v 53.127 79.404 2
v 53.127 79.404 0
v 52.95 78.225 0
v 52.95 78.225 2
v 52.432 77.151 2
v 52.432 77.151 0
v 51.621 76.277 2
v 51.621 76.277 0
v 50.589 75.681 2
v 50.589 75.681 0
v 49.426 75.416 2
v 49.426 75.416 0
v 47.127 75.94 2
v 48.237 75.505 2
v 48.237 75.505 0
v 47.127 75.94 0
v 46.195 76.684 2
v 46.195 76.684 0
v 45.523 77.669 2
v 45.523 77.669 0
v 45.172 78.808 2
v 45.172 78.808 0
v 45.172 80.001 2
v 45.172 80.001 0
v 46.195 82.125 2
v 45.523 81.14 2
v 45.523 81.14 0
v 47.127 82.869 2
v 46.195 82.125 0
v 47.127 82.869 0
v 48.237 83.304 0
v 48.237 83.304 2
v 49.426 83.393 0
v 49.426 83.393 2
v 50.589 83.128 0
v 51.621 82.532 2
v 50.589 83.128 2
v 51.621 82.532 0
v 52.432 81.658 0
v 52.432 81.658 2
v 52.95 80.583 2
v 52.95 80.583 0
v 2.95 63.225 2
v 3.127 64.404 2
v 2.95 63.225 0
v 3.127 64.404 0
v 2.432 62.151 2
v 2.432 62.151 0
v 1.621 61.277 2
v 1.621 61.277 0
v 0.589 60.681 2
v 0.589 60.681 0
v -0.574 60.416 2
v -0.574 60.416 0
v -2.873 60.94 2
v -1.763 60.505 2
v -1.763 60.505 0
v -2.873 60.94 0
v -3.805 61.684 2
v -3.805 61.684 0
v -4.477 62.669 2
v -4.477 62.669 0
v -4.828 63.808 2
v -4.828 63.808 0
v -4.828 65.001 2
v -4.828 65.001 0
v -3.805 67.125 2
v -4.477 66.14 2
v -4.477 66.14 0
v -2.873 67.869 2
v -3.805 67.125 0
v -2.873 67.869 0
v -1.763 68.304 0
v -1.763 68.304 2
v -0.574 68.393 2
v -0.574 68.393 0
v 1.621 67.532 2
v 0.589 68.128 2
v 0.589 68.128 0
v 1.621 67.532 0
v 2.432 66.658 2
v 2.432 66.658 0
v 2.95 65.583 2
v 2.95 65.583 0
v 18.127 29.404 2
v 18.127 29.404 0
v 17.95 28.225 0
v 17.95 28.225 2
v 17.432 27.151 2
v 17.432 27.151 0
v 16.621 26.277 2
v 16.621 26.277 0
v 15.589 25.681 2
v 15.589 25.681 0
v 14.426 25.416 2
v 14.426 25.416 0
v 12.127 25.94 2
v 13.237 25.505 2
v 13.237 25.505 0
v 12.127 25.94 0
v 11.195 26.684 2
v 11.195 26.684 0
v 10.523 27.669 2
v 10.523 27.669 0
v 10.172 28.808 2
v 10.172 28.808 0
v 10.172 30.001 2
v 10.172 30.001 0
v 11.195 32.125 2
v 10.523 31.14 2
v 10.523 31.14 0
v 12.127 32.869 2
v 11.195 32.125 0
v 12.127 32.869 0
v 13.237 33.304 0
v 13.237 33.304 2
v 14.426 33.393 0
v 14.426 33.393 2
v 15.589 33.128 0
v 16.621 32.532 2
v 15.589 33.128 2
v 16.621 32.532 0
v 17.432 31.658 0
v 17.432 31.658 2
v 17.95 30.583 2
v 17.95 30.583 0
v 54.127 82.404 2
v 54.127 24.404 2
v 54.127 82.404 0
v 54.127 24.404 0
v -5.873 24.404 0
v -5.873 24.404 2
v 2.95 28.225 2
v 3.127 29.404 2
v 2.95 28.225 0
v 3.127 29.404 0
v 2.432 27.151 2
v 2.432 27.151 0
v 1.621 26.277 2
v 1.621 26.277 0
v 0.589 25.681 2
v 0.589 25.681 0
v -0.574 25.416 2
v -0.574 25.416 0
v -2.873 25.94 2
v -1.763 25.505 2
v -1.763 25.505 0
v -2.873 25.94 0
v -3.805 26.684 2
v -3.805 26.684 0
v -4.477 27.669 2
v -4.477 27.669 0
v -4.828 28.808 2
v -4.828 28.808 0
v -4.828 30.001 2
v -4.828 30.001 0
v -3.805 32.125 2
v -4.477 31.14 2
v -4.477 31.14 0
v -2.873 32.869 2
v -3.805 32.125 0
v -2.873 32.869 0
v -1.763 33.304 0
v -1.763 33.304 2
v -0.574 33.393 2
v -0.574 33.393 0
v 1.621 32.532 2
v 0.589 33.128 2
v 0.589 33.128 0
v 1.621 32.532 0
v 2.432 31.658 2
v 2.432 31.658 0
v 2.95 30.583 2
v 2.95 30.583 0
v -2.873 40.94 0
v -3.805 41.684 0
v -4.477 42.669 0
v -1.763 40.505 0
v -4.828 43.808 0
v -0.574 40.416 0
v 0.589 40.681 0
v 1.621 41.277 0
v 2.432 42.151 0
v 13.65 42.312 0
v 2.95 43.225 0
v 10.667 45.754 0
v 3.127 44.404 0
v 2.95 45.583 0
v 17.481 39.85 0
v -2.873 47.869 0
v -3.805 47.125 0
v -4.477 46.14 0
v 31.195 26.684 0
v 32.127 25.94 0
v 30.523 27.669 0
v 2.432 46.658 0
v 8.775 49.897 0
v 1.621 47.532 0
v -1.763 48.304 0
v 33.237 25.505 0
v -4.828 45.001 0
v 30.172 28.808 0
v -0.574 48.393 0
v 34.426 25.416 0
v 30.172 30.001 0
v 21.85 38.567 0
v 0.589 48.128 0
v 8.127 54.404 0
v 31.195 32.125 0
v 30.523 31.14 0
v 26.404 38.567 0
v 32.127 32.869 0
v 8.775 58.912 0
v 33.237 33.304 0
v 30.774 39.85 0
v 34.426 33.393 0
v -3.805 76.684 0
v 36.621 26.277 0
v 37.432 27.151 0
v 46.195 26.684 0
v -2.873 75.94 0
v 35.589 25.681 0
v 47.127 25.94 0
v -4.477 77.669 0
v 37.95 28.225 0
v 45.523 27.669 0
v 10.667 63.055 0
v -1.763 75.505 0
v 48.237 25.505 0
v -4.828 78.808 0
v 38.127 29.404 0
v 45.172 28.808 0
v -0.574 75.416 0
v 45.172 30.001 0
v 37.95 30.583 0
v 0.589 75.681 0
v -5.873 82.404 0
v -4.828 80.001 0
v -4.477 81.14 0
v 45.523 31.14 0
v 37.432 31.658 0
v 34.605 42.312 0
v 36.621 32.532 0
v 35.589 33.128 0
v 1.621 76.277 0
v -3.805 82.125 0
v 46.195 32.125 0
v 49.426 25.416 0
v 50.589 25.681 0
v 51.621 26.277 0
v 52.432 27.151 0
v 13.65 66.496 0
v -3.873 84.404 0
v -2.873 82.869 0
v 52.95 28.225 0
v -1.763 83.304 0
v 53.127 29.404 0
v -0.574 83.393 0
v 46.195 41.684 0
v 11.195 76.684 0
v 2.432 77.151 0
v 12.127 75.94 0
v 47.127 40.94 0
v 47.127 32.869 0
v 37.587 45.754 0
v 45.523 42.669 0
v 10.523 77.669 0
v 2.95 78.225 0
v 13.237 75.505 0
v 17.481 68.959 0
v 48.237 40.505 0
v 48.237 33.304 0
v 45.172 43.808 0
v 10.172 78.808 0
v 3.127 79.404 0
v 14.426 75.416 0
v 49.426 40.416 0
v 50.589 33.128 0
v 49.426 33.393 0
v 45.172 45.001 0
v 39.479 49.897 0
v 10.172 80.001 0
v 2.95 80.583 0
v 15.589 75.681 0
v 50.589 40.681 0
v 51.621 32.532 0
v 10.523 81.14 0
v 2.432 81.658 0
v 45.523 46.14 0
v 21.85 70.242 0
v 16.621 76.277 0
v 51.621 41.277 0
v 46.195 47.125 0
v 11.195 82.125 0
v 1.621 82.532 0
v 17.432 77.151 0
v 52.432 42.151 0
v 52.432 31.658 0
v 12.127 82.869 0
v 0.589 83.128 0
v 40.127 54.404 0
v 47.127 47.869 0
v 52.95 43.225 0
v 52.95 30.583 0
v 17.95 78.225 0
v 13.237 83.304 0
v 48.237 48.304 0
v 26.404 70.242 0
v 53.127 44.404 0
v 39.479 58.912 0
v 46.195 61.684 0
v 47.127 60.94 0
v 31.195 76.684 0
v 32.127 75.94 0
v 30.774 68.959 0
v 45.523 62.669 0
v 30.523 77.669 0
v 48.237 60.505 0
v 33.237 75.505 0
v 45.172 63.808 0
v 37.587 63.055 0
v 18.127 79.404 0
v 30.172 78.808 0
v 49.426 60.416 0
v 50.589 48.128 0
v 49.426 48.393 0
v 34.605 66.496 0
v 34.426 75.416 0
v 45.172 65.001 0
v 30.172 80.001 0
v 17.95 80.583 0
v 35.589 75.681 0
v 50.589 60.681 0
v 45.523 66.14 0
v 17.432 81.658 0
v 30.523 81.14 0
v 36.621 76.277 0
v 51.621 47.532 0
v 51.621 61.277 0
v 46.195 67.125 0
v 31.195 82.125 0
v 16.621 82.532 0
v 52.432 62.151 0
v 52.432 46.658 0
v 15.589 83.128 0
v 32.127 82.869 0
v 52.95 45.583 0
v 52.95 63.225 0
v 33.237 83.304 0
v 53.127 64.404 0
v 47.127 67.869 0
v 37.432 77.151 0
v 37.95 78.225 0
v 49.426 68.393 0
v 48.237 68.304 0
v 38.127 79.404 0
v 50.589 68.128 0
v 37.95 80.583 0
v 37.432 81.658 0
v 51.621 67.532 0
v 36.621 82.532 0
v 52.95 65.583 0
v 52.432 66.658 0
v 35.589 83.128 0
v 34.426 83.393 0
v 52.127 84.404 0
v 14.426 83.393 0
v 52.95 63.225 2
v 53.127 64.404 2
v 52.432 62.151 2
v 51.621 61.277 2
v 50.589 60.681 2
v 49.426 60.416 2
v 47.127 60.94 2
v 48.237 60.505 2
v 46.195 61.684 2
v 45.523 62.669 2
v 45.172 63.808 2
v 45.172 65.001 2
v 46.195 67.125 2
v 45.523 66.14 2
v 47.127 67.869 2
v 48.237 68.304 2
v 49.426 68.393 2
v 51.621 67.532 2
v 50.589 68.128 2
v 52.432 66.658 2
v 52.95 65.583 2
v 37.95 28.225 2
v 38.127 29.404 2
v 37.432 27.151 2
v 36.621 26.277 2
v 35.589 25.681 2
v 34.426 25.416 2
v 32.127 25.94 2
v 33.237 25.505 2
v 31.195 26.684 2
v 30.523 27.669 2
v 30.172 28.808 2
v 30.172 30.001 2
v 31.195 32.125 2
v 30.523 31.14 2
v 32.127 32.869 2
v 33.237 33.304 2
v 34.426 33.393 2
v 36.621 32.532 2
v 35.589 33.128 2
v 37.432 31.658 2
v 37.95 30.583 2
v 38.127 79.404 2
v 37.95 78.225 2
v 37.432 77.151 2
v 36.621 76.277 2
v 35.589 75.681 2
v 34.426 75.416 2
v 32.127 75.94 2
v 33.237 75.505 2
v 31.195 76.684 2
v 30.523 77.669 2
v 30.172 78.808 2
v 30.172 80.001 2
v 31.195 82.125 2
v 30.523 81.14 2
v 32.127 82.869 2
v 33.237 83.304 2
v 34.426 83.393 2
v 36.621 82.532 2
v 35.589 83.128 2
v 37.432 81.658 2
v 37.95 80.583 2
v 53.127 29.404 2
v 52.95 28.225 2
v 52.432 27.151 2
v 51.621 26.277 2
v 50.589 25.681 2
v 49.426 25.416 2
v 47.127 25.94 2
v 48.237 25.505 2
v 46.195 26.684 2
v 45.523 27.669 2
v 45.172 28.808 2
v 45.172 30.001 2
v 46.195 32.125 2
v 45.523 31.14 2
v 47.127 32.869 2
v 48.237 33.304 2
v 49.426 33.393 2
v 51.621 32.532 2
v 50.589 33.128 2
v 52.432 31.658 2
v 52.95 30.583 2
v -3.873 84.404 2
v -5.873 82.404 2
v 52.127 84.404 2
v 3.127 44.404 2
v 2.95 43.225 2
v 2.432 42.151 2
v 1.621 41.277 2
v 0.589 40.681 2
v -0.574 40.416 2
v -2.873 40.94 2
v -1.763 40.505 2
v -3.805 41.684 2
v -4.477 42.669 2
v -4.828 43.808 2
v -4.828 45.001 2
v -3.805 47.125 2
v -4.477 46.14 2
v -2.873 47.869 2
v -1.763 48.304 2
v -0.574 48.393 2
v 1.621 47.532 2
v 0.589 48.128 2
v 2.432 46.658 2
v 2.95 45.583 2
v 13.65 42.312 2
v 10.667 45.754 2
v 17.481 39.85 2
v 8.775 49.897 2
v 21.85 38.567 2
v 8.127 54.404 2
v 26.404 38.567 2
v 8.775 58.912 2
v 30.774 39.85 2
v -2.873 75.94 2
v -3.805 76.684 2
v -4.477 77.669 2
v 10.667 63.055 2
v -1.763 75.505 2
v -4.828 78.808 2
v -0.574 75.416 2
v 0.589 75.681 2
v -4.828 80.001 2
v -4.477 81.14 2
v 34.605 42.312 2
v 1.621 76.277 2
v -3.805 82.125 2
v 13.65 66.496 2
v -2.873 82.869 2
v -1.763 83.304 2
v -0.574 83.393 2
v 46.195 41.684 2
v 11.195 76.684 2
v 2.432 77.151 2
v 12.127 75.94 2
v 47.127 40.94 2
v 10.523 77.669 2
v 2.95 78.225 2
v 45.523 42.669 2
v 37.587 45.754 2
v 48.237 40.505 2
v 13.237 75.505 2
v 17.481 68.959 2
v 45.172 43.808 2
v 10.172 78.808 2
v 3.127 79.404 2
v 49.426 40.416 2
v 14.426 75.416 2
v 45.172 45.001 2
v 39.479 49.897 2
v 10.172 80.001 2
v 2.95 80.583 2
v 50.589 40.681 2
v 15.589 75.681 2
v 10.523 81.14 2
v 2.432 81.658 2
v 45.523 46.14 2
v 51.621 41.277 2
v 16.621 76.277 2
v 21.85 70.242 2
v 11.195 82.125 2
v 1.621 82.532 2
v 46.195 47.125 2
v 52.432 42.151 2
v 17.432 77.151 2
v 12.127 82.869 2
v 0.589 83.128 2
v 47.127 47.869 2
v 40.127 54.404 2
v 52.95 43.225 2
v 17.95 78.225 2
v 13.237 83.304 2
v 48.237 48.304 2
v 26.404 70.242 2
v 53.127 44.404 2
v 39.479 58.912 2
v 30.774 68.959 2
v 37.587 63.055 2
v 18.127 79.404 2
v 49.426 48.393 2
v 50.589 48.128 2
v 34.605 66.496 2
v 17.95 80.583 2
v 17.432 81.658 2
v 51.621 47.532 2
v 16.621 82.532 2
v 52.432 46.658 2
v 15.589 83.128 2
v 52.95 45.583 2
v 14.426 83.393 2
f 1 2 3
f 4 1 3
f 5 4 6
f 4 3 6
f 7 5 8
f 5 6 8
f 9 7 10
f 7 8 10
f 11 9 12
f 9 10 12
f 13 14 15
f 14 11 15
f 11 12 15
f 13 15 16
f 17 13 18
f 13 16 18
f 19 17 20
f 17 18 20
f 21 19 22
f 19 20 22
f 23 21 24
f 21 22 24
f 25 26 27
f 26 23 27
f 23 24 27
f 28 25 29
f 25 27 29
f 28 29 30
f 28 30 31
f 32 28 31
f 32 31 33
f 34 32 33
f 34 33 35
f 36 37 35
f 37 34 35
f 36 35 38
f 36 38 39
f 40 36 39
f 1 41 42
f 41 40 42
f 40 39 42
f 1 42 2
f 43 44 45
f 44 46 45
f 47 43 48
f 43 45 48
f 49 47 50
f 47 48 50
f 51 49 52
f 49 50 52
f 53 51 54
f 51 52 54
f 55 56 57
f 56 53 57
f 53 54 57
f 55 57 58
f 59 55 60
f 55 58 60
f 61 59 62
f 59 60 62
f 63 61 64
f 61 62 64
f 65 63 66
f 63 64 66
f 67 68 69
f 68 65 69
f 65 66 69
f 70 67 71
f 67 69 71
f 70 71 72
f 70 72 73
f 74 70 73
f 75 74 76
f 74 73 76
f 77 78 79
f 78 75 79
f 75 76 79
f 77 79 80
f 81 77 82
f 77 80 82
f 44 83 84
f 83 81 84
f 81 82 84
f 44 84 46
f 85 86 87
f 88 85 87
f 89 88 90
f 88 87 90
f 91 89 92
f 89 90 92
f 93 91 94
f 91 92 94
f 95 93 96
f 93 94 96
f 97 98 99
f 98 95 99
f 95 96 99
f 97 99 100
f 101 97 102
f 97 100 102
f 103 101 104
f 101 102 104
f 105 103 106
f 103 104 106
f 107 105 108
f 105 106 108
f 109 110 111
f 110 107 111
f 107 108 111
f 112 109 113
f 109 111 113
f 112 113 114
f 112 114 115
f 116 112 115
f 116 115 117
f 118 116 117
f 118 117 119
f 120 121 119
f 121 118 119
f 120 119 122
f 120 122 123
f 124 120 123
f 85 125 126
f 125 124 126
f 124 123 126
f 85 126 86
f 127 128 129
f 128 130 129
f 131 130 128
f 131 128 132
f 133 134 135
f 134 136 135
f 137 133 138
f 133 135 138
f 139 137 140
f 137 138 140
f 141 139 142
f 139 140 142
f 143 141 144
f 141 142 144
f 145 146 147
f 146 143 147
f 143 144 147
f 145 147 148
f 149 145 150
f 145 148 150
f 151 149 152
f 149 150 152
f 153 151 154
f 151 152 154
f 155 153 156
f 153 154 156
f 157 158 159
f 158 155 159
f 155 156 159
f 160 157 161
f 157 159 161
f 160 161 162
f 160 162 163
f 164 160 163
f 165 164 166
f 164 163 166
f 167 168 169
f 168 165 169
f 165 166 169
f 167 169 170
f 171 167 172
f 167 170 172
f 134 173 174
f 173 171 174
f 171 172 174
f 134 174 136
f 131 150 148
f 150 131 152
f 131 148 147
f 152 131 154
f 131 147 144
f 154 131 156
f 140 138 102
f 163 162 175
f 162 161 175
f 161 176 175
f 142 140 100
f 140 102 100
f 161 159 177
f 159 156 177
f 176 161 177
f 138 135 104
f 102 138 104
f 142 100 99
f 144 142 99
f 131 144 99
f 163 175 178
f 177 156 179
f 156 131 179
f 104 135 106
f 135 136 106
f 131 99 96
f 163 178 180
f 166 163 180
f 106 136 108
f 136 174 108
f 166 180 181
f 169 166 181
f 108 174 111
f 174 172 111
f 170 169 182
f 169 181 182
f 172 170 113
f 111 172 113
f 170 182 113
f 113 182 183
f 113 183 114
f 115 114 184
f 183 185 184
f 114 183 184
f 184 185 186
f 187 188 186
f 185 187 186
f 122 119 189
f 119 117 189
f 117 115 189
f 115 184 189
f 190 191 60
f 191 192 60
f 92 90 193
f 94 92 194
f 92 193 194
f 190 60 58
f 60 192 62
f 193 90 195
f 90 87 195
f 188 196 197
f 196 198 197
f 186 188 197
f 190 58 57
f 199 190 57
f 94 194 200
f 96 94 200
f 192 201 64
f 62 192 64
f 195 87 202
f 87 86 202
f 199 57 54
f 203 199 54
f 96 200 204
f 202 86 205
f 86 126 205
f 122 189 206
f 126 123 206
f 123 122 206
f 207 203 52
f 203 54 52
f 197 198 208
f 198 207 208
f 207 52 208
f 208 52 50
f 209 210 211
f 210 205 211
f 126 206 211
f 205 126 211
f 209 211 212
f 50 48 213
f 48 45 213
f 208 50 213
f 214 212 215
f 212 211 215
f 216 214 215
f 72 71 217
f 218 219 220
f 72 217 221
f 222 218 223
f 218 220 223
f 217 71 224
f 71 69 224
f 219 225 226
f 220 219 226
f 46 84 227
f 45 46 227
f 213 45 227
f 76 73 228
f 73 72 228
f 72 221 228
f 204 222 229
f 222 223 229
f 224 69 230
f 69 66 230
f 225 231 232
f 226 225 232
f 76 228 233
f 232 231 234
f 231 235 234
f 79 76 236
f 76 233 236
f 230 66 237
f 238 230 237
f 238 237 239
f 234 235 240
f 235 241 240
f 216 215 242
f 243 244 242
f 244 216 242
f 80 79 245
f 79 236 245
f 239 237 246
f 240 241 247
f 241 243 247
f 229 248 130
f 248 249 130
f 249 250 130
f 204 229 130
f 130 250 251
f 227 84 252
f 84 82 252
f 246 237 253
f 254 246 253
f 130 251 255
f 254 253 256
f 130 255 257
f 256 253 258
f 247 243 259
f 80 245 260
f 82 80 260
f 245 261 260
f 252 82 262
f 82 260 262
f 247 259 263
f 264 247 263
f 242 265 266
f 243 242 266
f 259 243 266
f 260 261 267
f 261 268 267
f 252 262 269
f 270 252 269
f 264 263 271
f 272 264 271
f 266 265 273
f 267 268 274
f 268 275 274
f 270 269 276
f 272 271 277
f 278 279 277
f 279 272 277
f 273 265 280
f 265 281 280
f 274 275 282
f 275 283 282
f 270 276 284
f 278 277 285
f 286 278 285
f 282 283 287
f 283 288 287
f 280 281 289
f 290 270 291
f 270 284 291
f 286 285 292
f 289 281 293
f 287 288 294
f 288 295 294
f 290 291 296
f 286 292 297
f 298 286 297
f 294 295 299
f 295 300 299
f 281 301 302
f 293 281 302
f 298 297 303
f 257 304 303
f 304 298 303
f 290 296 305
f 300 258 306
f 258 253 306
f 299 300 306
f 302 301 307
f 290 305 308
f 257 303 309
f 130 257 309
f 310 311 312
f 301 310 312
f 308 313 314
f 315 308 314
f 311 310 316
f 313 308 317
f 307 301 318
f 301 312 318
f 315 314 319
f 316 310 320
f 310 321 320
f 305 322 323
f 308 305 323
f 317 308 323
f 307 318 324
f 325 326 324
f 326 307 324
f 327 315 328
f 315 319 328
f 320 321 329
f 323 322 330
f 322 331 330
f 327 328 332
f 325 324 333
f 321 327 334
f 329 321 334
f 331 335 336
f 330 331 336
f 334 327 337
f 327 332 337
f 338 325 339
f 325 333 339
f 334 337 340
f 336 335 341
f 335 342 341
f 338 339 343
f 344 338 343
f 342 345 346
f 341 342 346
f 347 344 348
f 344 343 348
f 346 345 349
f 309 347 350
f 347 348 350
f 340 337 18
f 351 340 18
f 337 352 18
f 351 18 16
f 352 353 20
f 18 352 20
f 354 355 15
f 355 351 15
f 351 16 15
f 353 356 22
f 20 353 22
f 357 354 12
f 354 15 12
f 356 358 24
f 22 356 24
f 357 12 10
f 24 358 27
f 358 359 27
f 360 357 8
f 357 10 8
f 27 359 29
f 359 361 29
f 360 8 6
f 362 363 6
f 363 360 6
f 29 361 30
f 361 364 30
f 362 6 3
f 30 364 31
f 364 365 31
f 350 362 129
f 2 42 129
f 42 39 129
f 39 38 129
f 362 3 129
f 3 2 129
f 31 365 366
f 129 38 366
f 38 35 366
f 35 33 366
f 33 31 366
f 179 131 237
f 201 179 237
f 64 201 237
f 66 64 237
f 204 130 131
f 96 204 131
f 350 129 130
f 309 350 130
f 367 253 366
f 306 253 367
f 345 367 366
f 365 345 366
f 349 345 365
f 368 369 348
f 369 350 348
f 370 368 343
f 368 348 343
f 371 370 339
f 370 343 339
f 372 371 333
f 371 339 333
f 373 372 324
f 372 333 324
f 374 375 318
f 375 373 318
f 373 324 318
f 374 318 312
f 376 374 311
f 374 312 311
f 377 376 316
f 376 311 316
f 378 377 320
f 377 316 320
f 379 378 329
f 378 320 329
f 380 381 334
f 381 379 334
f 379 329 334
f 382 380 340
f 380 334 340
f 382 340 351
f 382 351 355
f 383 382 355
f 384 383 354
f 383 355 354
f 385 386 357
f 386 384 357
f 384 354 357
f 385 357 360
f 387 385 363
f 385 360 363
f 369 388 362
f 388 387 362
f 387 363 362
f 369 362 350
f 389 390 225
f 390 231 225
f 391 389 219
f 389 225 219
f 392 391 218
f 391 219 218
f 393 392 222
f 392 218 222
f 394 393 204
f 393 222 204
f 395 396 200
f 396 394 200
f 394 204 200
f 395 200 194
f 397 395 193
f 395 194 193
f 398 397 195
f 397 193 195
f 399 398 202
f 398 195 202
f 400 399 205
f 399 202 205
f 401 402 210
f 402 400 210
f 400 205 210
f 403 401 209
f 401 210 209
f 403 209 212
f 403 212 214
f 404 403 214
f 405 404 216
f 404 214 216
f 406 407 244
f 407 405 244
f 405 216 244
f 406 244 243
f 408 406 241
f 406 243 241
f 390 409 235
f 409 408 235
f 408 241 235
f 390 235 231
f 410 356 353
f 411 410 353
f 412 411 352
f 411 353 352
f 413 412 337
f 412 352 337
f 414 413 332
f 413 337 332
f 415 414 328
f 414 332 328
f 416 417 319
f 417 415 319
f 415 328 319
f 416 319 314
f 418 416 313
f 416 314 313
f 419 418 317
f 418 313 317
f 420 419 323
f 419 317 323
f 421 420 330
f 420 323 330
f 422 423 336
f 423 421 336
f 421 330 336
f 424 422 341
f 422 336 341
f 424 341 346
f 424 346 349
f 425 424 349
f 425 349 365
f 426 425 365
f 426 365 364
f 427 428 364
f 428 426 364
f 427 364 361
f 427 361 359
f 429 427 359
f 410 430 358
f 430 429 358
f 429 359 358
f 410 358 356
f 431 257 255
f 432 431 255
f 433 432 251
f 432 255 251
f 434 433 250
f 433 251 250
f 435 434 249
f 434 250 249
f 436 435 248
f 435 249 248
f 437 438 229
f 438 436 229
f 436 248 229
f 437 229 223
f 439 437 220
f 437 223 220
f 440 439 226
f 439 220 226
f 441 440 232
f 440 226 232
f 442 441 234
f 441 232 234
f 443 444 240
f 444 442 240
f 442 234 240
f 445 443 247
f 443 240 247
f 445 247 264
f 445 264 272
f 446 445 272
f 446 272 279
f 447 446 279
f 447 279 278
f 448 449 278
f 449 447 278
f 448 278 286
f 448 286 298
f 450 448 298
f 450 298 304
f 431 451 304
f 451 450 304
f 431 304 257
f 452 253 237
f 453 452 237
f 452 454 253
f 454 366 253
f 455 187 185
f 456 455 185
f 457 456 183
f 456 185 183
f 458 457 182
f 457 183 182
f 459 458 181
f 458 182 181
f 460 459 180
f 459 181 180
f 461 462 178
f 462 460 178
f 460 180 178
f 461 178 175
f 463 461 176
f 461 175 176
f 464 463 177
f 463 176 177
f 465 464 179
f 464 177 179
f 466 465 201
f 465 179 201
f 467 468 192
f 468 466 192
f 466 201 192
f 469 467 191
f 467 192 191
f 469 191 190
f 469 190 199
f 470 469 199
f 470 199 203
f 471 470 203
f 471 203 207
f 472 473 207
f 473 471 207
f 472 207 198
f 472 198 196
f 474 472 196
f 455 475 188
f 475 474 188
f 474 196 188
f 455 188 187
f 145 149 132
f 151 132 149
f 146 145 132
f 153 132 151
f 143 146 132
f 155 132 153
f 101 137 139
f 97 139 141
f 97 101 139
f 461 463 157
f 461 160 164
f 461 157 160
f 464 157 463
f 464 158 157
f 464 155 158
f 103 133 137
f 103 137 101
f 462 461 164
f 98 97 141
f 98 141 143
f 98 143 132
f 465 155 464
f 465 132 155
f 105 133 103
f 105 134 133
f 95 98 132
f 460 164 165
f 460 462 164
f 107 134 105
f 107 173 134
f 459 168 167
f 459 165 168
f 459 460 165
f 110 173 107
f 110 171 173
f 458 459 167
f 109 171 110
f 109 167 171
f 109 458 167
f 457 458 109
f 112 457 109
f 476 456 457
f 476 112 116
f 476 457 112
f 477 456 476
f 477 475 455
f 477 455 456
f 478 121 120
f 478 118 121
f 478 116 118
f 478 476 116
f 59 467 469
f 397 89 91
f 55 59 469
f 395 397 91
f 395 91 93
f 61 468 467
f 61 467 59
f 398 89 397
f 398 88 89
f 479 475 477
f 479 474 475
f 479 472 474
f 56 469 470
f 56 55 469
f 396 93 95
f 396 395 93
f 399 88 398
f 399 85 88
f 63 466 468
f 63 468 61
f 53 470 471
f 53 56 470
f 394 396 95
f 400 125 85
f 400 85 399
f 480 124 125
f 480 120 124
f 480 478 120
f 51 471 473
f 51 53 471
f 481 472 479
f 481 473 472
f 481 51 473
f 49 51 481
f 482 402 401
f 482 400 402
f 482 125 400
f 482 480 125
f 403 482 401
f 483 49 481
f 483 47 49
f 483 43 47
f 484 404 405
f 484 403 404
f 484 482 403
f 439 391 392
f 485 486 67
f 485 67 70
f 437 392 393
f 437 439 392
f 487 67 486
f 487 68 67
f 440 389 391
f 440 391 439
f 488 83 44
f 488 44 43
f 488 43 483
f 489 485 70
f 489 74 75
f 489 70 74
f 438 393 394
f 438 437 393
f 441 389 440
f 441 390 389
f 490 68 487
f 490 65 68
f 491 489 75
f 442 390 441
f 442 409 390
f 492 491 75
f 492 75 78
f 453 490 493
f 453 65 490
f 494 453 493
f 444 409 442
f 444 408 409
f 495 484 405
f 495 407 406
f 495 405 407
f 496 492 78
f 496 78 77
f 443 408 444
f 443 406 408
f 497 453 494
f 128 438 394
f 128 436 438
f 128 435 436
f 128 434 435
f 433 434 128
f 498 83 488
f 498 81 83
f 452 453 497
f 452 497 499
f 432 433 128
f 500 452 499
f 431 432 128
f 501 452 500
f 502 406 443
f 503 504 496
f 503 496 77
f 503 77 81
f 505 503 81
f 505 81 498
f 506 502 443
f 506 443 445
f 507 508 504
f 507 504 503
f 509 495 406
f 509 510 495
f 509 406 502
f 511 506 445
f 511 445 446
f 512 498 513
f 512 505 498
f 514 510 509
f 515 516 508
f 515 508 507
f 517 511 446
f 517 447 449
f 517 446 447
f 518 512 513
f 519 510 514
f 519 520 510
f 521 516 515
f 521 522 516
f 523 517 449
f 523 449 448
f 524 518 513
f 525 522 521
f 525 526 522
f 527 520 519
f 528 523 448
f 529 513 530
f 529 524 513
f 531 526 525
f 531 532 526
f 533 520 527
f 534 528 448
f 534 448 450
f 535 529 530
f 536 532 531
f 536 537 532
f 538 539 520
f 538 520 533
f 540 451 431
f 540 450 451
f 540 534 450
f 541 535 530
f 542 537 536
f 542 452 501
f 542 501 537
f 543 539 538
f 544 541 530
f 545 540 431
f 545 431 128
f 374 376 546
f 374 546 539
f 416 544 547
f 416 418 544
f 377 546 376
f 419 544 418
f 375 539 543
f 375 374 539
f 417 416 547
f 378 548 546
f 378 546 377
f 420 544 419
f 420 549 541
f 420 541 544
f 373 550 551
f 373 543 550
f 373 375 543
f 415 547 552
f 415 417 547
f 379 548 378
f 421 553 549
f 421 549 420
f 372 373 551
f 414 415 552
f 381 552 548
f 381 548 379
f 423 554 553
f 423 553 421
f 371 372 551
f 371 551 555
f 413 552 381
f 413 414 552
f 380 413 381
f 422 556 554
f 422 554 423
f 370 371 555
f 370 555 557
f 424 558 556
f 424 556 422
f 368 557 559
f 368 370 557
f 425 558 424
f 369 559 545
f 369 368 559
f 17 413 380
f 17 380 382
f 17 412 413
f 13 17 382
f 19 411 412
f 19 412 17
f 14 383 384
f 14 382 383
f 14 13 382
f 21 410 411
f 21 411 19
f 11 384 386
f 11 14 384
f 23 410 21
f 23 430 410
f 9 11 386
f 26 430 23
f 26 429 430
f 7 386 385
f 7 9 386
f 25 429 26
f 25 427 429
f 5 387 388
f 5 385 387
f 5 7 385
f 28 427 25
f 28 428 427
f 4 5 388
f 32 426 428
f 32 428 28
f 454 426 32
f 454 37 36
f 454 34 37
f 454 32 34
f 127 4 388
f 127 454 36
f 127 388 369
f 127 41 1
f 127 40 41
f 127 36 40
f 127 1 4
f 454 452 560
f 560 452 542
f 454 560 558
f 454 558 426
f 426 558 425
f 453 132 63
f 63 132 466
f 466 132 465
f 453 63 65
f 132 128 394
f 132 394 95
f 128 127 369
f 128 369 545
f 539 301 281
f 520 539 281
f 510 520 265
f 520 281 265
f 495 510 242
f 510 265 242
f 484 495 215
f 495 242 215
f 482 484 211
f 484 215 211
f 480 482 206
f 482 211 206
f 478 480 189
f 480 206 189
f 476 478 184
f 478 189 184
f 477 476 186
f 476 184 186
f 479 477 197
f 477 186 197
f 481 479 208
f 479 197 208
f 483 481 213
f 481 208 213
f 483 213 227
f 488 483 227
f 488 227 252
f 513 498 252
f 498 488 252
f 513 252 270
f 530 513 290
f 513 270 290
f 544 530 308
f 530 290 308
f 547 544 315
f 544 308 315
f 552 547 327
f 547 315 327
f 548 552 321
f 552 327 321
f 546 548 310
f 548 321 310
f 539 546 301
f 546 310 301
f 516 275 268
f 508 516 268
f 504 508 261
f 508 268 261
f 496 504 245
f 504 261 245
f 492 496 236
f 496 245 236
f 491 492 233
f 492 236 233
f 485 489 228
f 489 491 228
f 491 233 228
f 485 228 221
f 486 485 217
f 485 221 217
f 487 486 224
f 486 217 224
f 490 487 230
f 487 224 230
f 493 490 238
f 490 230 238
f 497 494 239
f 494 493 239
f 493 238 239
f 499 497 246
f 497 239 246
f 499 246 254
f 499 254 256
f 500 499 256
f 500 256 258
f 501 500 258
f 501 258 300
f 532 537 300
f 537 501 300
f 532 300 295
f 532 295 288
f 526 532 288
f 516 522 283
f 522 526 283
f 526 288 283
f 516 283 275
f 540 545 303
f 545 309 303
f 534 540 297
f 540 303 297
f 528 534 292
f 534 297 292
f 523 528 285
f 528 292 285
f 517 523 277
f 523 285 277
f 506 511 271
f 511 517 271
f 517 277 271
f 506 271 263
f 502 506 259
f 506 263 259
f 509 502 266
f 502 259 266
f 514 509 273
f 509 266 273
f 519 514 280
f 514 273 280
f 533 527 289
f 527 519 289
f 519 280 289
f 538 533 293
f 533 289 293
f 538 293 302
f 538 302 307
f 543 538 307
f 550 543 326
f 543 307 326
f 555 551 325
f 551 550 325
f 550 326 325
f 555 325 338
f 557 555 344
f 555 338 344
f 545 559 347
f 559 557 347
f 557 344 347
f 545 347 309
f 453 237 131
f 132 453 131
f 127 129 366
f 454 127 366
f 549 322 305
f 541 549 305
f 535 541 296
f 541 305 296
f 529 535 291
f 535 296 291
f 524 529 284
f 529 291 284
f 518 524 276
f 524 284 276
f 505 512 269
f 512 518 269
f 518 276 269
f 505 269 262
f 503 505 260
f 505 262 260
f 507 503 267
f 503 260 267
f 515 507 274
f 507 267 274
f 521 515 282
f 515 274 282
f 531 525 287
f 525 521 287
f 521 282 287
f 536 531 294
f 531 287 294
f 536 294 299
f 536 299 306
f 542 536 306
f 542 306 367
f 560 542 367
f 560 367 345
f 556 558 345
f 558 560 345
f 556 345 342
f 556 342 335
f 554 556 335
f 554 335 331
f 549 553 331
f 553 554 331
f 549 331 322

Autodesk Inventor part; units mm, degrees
ref_plane "YZ Plane" through (0, 0, 0) normal (1, 0, 0) x (0, 1, 0)
ref_plane "XZ Plane" through (0, 0, 0) normal (0, 1, 0) x (-1, 0, 0)
ref_plane "XY Plane" through (0, 0, 0) normal (0, 0, 1) x (1, 0, 0)
ref_plane "Work Plane1" through (0, 0, 0) normal (0, 0, 1) x (1, 0, 0)
sketch "Sketch1" plane through (0, 0, 0) normal (0, 0, 1) x (1, 0, 0)
  circle A0 centre (24.1273, 54.4044) radius 16 projected
  circle A1 centre (34.1273, 29.4044) radius 4 projected
  circle A2 centre (49.1273, 64.4044) radius 4 projected
  circle A3 centre (14.1273, 79.4044) radius 4 projected
  circle A4 centre (-0.8727, 44.4044) radius 4 projected
  circle A5 centre (-0.8727, 64.4044) radius 4 projected
  circle A6 centre (34.1273, 79.4044) radius 4 projected
  circle A7 centre (49.1273, 44.4044) radius 4 projected
  circle A8 centre (14.1273, 29.4044) radius 4 projected
  arc A9 (-5.8727, -21.5956) -> (-1.8727, -25.5956) centre (-1.8727, -21.5956) ccw projected
  line L0 (-1.8727, -25.5956) -> (2.1273, -25.5956) projected
  arc A10 (2.1273, -25.5956) -> (6.1273, -21.5956) centre (2.1273, -21.5956) ccw projected
  line L1 (6.1273, -21.5956) -> (6.1273, 20.4044) projected
  arc A11 (10.1273, 24.4044) -> (6.1273, 20.4044) centre (10.1273, 20.4044) ccw projected
  line L2 (10.1273, 24.4044) -> (38.1273, 24.4044) projected
  arc A12 (42.1273, 20.4044) -> (38.1273, 24.4044) centre (38.1273, 20.4044) ccw projected
  line L3 (42.1273, 20.4044) -> (42.1273, -21.5956) projected
  arc A13 (42.1273, -21.5956) -> (46.1273, -25.5956) centre (46.1273, -21.5956) ccw projected
  line L4 (46.1273, -25.5956) -> (50.1273, -25.5956) projected
  arc A14 (50.1273, -25.5956) -> (54.1273, -21.5956) centre (50.1273, -21.5956) ccw projected
  line L5 (54.1273, -21.5956) -> (54.1273, 82.4044) projected
  line L6 (54.1273, 82.4044) -> (52.1273, 84.4044) projected
  line L7 (52.1273, 84.4044) -> (-3.8727, 84.4044) projected
  line L8 (-3.8727, 84.4044) -> (-5.8727, 82.4044) projected
  line L9 (-5.8727, 82.4044) -> (-5.8727, -21.5956) projected
  line L10 (-5.8727, 84.4044) -> (54.1273, 84.4044)
  line L11 (54.1273, 84.4044) -> (54.1273, 24.4044)
  line L12 (54.1273, 24.4044) -> (-5.8727, 24.4044)
  line L13 (-5.8727, 24.4044) -> (-5.8727, 84.4044)
  line L14 (-5.8727, 84.4044) -> (54.1273, 24.4044) construction
  line L15 (54.1273, 84.4044) -> (-5.8727, 24.4044) construction
  circle A15 centre (24.1273, 54.4044) radius 16 projected
  circle A16 centre (34.1273, 29.4044) radius 4 projected
  circle A17 centre (49.1273, 64.4044) radius 4 projected
  circle A18 centre (14.1273, 79.4044) radius 4 projected
  circle A19 centre (-0.8727, 44.4044) radius 4 projected
  circle A20 centre (-0.8727, 64.4044) radius 4 projected
  circle A21 centre (34.1273, 79.4044) radius 4 projected
  circle A22 centre (49.1273, 44.4044) radius 4 projected
  circle A23 centre (14.1273, 29.4044) radius 4 projected
  arc A24 (-5.8727, -21.5956) -> (-1.8727, -25.5956) centre (-1.8727, -21.5956) ccw projected
  line L16 (-1.8727, -25.5956) -> (2.1273, -25.5956) projected
  arc A25 (2.1273, -25.5956) -> (6.1273, -21.5956) centre (2.1273, -21.5956) ccw projected
  line L17 (6.1273, -21.5956) -> (6.1273, 20.4044) projected
  arc A26 (10.1273, 24.4044) -> (6.1273, 20.4044) centre (10.1273, 20.4044) ccw projected
  line L18 (10.1273, 24.4044) -> (38.1273, 24.4044) projected
  arc A27 (42.1273, 20.4044) -> (38.1273, 24.4044) centre (38.1273, 20.4044) ccw projected
  line L19 (42.1273, 20.4044) -> (42.1273, -21.5956) projected
  arc A28 (42.1273, -21.5956) -> (46.1273, -25.5956) centre (46.1273, -21.5956) ccw projected
  line L20 (46.1273, -25.5956) -> (50.1273, -25.5956) projected
  arc A29 (50.1273, -25.5956) -> (54.1273, -21.5956) centre (50.1273, -21.5956) ccw projected
  line L21 (54.1273, -21.5956) -> (54.1273, 82.4044) projected
  line L22 (54.1273, 82.4044) -> (52.1273, 84.4044) projected
  line L23 (52.1273, 84.4044) -> (-3.8727, 84.4044) projected
  line L24 (-3.8727, 84.4044) -> (-5.8727, 82.4044) projected
  line L25 (-5.8727, 82.4044) -> (-5.8727, -21.5956) projected
  circle A30 centre (-0.8727, 29.4044) radius 4 projected
  circle A31 centre (-0.8727, 79.4044) radius 4 projected
  circle A32 centre (49.1273, 29.4044) radius 4 projected
  circle A33 centre (41.6273, 36.9044) radius 1.95 projected
  circle A34 centre (41.6273, 71.9044) radius 1.95 projected
  circle A35 centre (6.6273, 71.9044) radius 1.95 projected
  circle A36 centre (-0.8727, 29.4044) radius 4 projected
  circle A37 centre (-0.8727, 79.4044) radius 4 projected
  circle A38 centre (49.1273, 29.4044) radius 4 projected
  circle A39 centre (41.6273, 36.9044) radius 1.95 projected
  circle A40 centre (41.6273, 71.9044) radius 1.95 projected
  circle A41 centre (6.6273, 71.9044) radius 1.95 projected
  circle A42 centre (49.1273, 79.4044) radius 4 projected
  circle A43 centre (49.1273, 79.4044) radius 4 projected
  point P0 (0, 0)
extrude "Extrusion1" add sketch "Sketch1" along normal blind 2 contours L9 L8 L7 L6 L5 L12 L2 | A33 | A34 | A35
properties part number "cellSTORM_UC2_motorized_xystage_spacer"
